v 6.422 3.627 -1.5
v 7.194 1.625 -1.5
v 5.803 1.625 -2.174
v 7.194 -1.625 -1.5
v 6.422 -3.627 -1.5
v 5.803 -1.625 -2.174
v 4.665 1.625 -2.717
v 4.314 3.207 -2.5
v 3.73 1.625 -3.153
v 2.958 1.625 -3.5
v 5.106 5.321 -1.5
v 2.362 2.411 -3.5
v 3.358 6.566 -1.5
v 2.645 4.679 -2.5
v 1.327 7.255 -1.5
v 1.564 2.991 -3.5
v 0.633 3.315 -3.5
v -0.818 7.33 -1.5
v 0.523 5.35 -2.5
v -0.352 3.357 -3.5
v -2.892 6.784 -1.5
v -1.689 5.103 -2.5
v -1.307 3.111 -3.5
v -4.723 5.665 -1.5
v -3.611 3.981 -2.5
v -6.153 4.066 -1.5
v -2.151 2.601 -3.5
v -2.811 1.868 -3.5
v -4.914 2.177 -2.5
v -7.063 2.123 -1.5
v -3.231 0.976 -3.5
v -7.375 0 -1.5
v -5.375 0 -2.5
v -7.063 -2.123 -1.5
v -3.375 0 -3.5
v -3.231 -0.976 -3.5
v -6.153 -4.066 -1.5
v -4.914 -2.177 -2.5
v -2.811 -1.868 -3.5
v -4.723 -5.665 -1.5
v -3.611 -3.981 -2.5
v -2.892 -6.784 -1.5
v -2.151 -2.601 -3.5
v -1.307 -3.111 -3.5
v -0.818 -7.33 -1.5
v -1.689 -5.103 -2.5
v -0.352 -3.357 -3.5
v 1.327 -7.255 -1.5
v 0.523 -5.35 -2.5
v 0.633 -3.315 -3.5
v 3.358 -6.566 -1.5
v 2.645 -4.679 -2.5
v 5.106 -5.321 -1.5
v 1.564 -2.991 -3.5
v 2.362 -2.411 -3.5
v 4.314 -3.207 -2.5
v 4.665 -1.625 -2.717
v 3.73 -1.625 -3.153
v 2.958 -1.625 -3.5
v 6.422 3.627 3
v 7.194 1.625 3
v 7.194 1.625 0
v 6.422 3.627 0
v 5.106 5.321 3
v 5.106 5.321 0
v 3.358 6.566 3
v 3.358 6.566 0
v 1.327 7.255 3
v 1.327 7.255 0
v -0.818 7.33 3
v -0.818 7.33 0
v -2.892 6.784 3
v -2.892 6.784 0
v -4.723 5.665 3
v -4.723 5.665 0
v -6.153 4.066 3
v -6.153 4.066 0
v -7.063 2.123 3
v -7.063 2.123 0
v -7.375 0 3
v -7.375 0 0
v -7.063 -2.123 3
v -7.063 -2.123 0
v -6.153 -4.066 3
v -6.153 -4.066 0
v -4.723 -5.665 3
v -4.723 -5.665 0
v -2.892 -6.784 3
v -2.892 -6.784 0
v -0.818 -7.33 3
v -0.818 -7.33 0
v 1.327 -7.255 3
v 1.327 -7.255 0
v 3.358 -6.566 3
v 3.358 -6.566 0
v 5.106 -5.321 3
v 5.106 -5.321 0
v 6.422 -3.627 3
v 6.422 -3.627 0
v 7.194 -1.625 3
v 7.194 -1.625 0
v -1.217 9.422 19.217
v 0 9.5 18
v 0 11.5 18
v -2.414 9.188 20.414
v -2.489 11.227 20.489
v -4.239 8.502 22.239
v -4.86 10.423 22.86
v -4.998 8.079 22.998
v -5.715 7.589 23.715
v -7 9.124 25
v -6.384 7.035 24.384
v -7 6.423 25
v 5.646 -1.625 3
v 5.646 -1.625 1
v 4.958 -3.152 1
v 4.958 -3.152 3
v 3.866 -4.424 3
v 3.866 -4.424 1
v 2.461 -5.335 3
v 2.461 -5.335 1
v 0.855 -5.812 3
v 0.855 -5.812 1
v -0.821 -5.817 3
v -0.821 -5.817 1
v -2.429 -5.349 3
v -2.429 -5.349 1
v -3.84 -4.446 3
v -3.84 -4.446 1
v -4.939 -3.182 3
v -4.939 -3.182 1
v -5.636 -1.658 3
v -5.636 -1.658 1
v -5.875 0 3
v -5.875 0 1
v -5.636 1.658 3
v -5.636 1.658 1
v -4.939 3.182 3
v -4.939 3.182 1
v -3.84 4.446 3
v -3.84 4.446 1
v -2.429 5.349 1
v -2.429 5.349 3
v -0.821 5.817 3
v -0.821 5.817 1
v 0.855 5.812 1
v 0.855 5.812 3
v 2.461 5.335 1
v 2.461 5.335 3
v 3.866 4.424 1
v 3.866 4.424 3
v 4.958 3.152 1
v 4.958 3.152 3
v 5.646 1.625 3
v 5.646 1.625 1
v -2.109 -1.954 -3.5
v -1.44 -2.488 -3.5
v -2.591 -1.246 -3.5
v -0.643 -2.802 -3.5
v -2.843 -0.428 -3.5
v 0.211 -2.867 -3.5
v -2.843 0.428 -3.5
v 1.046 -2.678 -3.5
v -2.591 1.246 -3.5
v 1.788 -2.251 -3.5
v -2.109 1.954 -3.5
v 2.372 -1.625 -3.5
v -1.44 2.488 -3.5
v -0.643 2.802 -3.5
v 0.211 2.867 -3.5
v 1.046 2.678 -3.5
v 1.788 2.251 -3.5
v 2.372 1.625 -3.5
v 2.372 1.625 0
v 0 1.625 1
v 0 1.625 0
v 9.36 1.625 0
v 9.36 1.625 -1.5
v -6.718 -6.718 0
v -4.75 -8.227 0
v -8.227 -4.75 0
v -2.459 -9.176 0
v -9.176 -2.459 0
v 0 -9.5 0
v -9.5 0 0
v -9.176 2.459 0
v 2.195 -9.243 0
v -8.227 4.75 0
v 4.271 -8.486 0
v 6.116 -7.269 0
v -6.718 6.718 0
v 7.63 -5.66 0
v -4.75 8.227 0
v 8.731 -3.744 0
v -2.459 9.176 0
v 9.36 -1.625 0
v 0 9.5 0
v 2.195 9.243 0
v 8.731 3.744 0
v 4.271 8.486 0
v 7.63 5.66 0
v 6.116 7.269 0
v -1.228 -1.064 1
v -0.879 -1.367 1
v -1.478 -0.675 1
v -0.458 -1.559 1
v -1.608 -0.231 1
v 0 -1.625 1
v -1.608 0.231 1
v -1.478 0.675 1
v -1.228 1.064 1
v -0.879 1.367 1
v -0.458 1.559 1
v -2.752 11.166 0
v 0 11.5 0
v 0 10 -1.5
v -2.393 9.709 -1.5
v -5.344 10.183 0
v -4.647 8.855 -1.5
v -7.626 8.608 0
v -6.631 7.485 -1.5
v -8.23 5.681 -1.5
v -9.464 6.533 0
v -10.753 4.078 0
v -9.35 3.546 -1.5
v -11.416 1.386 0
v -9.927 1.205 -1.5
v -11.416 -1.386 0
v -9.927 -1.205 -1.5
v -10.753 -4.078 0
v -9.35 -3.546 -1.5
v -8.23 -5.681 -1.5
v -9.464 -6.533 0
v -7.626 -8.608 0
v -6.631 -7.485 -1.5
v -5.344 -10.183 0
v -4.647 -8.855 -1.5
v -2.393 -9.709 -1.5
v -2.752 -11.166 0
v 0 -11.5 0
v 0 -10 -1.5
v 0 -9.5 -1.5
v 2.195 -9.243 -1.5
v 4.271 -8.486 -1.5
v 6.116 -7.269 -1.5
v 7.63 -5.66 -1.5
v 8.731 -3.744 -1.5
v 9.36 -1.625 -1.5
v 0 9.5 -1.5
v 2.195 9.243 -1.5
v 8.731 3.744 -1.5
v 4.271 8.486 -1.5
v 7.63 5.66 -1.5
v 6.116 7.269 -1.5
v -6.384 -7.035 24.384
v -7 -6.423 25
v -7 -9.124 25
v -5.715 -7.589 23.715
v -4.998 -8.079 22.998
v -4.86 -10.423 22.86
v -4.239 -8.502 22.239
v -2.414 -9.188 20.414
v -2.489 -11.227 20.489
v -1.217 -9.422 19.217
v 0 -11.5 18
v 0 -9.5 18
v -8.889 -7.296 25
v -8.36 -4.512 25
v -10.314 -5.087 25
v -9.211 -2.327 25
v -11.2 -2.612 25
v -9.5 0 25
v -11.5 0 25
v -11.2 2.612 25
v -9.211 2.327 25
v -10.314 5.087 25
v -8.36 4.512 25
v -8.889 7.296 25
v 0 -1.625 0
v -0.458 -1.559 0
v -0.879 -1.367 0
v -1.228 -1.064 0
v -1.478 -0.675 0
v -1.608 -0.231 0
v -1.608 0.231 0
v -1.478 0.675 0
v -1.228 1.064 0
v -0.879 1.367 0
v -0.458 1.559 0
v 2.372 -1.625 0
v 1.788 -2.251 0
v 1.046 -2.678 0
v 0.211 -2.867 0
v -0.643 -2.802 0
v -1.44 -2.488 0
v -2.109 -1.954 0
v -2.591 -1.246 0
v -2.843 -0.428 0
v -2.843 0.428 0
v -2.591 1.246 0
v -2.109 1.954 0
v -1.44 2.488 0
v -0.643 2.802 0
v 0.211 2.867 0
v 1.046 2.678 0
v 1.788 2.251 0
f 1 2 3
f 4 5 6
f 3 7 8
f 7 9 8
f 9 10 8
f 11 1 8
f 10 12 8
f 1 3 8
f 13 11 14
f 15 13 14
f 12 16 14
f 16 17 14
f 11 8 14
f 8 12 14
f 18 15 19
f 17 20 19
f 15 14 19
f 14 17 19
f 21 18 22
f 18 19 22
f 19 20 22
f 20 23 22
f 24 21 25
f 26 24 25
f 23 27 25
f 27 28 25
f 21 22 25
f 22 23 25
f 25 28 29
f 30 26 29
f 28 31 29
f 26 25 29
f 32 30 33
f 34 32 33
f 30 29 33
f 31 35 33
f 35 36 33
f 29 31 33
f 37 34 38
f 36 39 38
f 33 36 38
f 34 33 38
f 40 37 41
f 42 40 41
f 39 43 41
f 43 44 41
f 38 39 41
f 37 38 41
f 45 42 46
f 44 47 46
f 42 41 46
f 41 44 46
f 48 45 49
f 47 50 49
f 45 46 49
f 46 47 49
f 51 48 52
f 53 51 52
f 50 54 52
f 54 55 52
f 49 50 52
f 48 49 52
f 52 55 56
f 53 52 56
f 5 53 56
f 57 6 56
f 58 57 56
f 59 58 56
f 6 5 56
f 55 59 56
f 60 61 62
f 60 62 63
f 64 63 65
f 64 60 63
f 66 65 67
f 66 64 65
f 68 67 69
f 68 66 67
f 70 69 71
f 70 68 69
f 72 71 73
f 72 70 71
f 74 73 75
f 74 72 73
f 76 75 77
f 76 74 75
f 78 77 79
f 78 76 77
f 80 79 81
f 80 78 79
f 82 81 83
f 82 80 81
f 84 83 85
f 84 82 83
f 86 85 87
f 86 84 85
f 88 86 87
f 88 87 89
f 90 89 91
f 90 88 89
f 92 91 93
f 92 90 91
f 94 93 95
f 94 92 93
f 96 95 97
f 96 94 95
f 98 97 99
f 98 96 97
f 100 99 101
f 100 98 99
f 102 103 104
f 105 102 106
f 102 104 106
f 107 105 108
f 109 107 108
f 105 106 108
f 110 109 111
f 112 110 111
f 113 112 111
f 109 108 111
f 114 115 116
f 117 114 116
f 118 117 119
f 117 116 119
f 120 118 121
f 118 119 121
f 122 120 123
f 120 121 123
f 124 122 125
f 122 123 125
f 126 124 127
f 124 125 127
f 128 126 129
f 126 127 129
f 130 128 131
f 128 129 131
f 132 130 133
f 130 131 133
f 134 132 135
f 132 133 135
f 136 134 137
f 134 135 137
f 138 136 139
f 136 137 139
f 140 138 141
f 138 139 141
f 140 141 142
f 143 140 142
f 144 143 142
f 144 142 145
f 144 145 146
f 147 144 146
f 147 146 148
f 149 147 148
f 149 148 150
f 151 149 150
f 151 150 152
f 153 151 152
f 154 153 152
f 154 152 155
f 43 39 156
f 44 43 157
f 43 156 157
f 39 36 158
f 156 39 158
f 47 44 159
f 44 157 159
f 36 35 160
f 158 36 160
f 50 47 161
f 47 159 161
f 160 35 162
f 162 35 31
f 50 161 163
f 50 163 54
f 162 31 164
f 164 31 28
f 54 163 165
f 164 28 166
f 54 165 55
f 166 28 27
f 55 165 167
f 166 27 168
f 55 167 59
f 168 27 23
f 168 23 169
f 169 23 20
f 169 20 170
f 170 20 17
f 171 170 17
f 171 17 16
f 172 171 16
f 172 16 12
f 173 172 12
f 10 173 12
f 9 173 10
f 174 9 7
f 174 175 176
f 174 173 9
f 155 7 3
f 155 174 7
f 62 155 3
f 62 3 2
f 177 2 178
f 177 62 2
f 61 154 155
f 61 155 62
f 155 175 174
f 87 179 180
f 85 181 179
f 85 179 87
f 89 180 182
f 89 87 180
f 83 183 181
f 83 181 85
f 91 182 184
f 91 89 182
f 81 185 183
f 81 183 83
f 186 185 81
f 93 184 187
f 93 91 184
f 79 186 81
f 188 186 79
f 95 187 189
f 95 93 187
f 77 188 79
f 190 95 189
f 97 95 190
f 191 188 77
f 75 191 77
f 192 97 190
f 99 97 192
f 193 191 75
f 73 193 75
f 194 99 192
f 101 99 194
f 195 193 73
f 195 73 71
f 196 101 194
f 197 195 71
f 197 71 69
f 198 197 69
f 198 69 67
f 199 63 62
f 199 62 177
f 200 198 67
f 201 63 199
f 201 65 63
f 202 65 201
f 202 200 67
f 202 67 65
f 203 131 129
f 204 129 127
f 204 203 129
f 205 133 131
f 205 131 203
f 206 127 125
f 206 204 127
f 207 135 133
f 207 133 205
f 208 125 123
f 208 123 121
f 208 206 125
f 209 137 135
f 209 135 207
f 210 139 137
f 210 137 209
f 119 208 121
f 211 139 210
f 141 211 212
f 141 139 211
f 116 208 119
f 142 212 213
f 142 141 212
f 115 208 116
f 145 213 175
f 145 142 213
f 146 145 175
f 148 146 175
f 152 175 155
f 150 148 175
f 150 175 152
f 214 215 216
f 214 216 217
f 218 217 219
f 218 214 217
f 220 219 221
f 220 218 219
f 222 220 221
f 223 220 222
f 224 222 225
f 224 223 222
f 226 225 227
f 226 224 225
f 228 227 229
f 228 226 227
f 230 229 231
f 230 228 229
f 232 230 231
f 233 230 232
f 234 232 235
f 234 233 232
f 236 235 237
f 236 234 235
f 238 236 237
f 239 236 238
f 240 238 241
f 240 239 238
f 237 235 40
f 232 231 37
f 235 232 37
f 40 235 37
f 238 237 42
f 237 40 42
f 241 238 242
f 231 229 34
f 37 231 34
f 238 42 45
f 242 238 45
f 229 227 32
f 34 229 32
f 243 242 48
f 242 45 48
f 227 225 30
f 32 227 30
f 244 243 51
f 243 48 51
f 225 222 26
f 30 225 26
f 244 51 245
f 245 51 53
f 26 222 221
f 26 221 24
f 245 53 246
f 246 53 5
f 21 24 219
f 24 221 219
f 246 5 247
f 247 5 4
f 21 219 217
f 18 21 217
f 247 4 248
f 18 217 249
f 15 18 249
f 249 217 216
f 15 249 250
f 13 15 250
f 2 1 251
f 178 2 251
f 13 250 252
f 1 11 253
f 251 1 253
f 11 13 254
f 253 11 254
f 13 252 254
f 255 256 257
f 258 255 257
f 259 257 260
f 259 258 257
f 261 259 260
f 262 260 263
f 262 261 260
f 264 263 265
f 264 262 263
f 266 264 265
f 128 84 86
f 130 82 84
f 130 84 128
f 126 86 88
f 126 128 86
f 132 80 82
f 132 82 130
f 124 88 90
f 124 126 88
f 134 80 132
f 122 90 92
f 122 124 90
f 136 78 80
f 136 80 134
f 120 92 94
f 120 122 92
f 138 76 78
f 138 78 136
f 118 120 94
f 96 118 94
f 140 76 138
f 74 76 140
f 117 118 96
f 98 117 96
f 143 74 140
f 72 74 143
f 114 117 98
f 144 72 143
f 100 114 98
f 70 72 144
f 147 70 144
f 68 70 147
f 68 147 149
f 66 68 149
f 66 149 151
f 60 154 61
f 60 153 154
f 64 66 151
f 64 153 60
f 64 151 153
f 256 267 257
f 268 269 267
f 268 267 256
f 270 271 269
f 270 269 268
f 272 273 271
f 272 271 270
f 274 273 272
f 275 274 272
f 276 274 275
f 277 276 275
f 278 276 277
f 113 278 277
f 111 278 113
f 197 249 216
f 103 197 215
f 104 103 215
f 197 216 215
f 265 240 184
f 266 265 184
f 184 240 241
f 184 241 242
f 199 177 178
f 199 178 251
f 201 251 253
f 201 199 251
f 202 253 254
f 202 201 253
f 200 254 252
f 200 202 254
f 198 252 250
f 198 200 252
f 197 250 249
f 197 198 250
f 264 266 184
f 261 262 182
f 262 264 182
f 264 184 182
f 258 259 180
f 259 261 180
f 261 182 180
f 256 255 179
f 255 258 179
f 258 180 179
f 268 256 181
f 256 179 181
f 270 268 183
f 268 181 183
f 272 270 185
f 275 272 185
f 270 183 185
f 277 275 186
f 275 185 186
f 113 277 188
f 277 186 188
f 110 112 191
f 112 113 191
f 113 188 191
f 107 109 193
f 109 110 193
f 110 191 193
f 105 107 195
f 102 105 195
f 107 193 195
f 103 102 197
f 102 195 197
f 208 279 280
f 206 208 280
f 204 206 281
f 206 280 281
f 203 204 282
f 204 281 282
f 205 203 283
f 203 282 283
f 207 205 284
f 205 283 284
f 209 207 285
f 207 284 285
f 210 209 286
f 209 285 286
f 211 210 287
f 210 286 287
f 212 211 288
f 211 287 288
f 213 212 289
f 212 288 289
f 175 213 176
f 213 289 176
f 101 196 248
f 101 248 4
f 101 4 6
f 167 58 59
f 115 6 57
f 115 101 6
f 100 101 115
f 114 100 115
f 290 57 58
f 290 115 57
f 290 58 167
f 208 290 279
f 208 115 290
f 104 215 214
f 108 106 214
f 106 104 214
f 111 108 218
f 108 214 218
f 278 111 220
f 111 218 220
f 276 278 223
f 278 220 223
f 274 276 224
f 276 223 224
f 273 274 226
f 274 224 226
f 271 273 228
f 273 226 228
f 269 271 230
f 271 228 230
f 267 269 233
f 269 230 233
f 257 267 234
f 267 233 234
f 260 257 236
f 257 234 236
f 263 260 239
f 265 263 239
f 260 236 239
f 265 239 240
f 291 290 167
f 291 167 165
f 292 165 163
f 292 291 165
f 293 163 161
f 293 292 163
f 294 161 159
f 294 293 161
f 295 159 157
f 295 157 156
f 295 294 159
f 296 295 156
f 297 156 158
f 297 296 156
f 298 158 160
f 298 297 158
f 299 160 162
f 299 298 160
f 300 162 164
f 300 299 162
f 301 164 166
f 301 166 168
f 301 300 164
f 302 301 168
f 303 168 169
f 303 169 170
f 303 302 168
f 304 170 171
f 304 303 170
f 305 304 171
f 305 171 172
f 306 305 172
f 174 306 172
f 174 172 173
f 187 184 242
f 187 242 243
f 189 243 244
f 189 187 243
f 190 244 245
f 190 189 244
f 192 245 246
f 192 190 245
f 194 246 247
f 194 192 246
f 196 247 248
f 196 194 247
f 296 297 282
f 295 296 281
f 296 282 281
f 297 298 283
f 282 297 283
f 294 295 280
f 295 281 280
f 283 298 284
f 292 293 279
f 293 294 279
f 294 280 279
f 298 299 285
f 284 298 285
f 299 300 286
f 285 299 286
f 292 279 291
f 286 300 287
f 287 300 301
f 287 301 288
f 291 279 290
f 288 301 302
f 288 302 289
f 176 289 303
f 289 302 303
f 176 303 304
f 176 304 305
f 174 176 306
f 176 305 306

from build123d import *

# Parameters (mm, degrees)
F1_DEPTH    = 3
F2_DEPTH    = 1
F3_DEPTH    = 3.5
F4_DEPTH    = 1.5
F5_DEPTH    = 1.5
F6_DEPTH    = 25
F7_T1_DEPTH = 38.0035618315
F7_T3_DEPTH = 38.0035618315
F8_SIZE2    = 3.99999
F8_SIZE     = 1.99999
F9_SIZE     = 1.5


# Not quite as in the source:
# - a fillet or chamfer that OpenCascade refuses, or shapes differently, is made with other operations: its cross-section is extruded or revolved along the edge and cut away or added
# - a fillet or chamfer is up to 0.001 mm smaller than in the source, because OpenCascade refuses the exact size


with BuildPart() as f1:
    # F0 (on Top) → F1 (new body)
    with BuildSketch(Plane.XY):
        with BuildLine():
            Line((5.6457948953, 1.625), (7.193747285, 1.625))
            ThreePointArc((7.193747285, 1.625), (-7.375, 0), (7.193747285, -1.625))
            Line((7.193747285, -1.625), (5.6457948953, -1.625))
            ThreePointArc((5.6457948953, -1.625), (-5.875, 0), (5.6457948953, 1.625))
        make_face()
    extrude(amount=F1_DEPTH)

    # F0 (on Top) → F2 (join)
    with BuildSketch(Plane.XY):
        with BuildLine():
            Line((2.3717082451, 1.625), (5.6457948953, 1.625))
            ThreePointArc((5.6457948953, 1.625), (-5.875, 0), (5.6457948953, -1.625))
            Line((5.6457948953, -1.625), (2.3717082451, -1.625))
            ThreePointArc((2.3717082451, -1.625), (-2.875, 0), (2.3717082451, 1.625))
        make_face()
        with BuildLine():
            Line((0, 1.625), (2.3717082451, 1.625))
            ThreePointArc((2.3717082451, 1.625), (-2.875, 0), (2.3717082451, -1.625))
            Line((2.3717082451, -1.625), (0, -1.625))
            ThreePointArc((0, -1.625), (-1.625, 0), (0, 1.625))
        make_face()
    extrude(amount=F2_DEPTH)

    # F0 (on Top) → F3 (join)
    with BuildSketch(Plane.XY):
        with BuildLine():
            Line((5.6457948953, 1.625), (7.193747285, 1.625))
            ThreePointArc((7.193747285, 1.625), (-7.375, 0), (7.193747285, -1.625))
            Line((7.193747285, -1.625), (5.6457948953, -1.625))
            ThreePointArc((5.6457948953, -1.625), (-5.875, 0), (5.6457948953, 1.625))
        make_face()
        with BuildLine():
            Line((2.3717082451, 1.625), (5.6457948953, 1.625))
            ThreePointArc((5.6457948953, 1.625), (-5.875, 0), (5.6457948953, -1.625))
            Line((5.6457948953, -1.625), (2.3717082451, -1.625))
            ThreePointArc((2.3717082451, -1.625), (-2.875, 0), (2.3717082451, 1.625))
        make_face()
    extrude(amount=-F3_DEPTH)

    # F0 (on Top) → F4 (join)
    with BuildSketch(Plane.XY):
        with BuildLine():
            Line((7.193747285, 1.625), (9.3599879808, 1.625))
            ThreePointArc((9.3599879808, 1.625), (6.1160649114, 7.2693706743), (0, 9.5))
            ThreePointArc((0, 9.5), (-9.5, 0), (0, -9.5))
            ThreePointArc((0, -9.5), (6.1160649114, -7.2693706743), (9.3599879808, -1.625))
            Line((9.3599879808, -1.625), (7.193747285, -1.625))
            ThreePointArc((7.193747285, -1.625), (-7.375, 0), (7.193747285, 1.625))
        make_face()
    extrude(amount=-F4_DEPTH)

    # F0 (on Top) → F5 (join)
    with BuildSketch(Plane.XY):
        with BuildLine():
            ThreePointArc((0, -9.5), (-9.5, 0), (0, 9.5))
            Line((0, 9.5), (0, 11.5))
            ThreePointArc((0, 11.5), (-11.5, 0), (0, -11.5))
            Line((0, -11.5), (0, -9.5))
        make_face()
    extrude(amount=-F5_DEPTH)

    # F0 (on Top) → F6 (join)
    with BuildSketch(Plane.XY):
        with BuildLine():
            ThreePointArc((0, -9.5), (-9.5, 0), (0, 9.5))
            Line((0, 9.5), (0, 11.5))
            ThreePointArc((0, 11.5), (-11.5, 0), (0, -11.5))
            Line((0, -11.5), (0, -9.5))
        make_face()
    extrude(amount=F6_DEPTH)

    # F7: chamfer of 7 on 2 edges, made by hand

    # F7_s2 → F7_t1 (cut)
    with BuildSketch(Plane.XZ.offset(-8.5017809158)):
        Polygon((-7, 25), (0, 18), (0, 25), align=None)
    extrude(amount=F7_T1_DEPTH, mode=Mode.SUBTRACT)

    # F7_s4 → F7_t3 (cut)
    with BuildSketch(Plane.XZ.offset(-29.5017809158)):
        Polygon((0, 18), (-7, 25), (0, 25), align=None)
    extrude(amount=F7_T3_DEPTH, mode=Mode.SUBTRACT)

    # F8 (size 2 and 4 in the source; OpenCascade refuses exactly that, so slightly less here)
    f8_edges = [f1.edges().sort_by_distance(p)[0] for p in [
        (-7.375, 0, -3.5),
    ]]
    f8_side = f1.faces().sort_by_distance((-7.375, 0, -2.5))[0]
    chamfer(f8_edges, length=F8_SIZE, length2=F8_SIZE2, reference=f8_side)

    # F9
    f9_edges = [f1.edges().sort_by_distance(p)[0] for p in [
        (-11.5, 0, -1.5),
    ]]
    chamfer(f9_edges, length=F9_SIZE)


solid = f1.part
